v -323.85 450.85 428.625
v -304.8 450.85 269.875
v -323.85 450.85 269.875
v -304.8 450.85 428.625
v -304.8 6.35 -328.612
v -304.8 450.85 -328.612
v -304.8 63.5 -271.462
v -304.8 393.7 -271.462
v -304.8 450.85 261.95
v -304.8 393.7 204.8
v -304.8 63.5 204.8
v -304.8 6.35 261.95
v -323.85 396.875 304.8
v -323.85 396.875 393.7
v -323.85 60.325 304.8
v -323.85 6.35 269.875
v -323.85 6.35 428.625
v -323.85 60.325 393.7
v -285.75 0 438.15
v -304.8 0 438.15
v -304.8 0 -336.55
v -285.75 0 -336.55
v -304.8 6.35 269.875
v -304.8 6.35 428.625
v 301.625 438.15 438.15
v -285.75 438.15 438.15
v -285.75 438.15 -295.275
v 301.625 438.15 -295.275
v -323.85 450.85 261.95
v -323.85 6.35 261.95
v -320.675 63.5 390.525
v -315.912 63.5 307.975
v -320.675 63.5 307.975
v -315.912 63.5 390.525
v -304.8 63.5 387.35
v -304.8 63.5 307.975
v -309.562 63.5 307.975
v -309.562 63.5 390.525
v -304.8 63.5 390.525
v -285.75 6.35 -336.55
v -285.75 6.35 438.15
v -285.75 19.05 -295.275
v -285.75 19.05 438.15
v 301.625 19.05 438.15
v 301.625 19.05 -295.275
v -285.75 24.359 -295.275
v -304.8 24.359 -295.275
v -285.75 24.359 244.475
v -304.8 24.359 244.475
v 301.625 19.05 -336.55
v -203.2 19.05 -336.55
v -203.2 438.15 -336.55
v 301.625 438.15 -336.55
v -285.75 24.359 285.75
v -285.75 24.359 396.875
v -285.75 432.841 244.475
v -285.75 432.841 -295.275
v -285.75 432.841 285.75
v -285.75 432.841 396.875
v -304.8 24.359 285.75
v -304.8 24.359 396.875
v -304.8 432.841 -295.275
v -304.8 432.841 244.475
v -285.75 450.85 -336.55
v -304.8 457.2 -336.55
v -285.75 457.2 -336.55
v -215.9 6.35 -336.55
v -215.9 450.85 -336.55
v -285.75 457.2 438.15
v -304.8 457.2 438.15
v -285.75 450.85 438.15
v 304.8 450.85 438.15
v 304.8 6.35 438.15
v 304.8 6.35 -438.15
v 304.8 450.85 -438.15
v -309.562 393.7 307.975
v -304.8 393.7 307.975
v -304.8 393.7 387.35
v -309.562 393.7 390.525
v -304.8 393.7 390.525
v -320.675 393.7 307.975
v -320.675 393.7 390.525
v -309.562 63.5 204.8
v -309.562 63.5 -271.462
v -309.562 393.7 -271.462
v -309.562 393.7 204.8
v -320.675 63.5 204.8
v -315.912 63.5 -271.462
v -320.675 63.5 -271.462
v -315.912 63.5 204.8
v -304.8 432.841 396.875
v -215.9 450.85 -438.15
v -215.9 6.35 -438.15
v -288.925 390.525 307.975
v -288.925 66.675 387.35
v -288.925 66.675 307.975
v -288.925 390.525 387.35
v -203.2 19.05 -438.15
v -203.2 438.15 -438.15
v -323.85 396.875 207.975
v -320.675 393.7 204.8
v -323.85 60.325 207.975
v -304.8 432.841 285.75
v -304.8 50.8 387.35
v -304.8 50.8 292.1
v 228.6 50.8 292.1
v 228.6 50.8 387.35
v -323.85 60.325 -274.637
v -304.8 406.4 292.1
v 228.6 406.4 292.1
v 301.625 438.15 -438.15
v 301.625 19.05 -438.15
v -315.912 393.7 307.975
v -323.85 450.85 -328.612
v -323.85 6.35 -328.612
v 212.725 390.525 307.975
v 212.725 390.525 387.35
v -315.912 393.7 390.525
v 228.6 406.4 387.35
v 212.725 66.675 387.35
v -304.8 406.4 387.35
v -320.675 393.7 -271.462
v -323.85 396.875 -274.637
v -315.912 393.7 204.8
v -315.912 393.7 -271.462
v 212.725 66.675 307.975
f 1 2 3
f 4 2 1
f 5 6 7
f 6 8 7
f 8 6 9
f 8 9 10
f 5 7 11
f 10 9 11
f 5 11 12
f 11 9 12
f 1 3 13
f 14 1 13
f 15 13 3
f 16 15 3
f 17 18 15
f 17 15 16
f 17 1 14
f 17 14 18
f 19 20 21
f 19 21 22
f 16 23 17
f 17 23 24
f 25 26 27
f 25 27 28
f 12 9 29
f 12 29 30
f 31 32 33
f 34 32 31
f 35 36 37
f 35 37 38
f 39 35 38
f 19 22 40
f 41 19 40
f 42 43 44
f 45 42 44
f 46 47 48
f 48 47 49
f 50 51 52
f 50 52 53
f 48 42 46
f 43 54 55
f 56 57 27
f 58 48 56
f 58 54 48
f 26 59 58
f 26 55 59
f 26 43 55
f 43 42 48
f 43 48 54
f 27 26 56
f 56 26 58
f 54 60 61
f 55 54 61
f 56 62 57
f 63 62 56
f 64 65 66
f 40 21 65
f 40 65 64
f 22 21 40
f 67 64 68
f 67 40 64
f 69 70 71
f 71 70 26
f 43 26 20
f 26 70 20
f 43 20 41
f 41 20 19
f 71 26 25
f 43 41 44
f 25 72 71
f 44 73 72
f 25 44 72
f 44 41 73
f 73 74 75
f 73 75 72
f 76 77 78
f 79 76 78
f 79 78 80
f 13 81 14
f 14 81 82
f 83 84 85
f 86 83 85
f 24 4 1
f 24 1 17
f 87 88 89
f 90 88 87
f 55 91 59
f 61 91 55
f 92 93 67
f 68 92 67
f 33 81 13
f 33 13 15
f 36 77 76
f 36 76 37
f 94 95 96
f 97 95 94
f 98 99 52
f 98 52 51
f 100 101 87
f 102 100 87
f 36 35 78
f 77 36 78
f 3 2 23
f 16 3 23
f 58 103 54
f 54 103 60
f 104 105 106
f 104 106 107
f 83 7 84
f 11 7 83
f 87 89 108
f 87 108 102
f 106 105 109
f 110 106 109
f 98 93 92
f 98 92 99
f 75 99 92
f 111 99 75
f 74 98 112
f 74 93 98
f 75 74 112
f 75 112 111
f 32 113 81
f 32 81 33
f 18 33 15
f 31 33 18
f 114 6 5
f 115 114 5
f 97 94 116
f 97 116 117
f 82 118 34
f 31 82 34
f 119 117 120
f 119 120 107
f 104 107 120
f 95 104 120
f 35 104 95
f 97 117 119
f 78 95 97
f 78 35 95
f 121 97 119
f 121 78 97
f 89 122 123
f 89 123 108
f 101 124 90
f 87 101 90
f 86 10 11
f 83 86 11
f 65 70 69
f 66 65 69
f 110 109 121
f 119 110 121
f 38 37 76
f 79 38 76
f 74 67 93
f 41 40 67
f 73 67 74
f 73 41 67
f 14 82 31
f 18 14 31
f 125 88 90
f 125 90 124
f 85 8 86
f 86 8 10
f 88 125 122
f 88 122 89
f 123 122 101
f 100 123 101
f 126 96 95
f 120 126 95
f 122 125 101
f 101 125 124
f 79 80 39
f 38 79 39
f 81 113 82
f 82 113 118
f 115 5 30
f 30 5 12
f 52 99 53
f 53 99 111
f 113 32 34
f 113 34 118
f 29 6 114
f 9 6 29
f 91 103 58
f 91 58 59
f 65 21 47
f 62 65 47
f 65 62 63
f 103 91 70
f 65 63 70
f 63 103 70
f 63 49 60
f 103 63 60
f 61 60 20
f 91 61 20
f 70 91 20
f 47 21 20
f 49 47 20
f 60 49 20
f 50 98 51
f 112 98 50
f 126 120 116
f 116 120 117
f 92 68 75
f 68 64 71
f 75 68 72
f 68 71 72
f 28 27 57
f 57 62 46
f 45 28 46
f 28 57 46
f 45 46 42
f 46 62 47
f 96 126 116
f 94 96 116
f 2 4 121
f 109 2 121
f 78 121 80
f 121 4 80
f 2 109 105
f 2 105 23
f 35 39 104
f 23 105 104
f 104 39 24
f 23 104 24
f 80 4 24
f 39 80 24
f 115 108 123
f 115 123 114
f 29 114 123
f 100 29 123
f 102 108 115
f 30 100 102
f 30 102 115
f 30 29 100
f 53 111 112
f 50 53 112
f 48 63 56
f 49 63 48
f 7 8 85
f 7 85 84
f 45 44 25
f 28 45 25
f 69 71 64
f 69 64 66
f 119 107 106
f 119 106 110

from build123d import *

# Parameters (mm, degrees)
F0_W          = 609.6
F0_H          = 876.3
F1_DEPTH      = 457.2
F2_W          = 88.9
F2_H          = 101.6
F3_DEPTH      = 457.201
F4_W          = 408.4819672131
F4_H          = 692.15
F5_DEPTH      = 19.05
F6_W          = 590.55
F6_H          = 6.35
F7_DEPTH      = 876.301
F8_W          = 587.375
F8_H          = 419.1
F9_DEPTH      = 733.425
F10_W         = 408.4819672131
F10_H         = 41.275
F11_DEPTH     = 19.05
F12_W         = 444.5
F12_H         = 590.5627
F12_W_2       = 330.2
F12_H_2       = 476.2627
F13_DEPTH     = 19.05
F14_W         = 6.35
F14_H         = 330.2
F15_DEPTH     = 476.2627
F16_SIZE      = 3.175
F17_W         = 444.5
F17_H         = 158.75
F17_W_2       = 330.2
F17_H_2       = 82.55
F18_DEPTH     = 19.05
F19_W         = 6.35
F19_H         = 330.2
F20_DEPTH     = 82.55
F21_SIZE      = 3.175
F22_W         = 504.825
F22_H         = 419.1
F23_DEPTH     = 101.6
F24_W         = 355.6
F24_H         = 95.25
F25_DEPTH     = 533.4
F26_T         = 15.875
F26_T3_DEPTH  = 37.249261314
F26_T5_DEPTH  = 37.249261314
F26_T7_DEPTH  = 37.249261314
F26_T9_DEPTH  = 37.249261314
F26_T11_DEPTH = 36.5125
F26_T13_DEPTH = 361.95
F26_T15_DEPTH = 114.3
F26_T17_DEPTH = 127
F26_T19_DEPTH = 387.35
F26_T21_DEPTH = 111.125
F26_T23_DEPTH = 36.5125


# Not quite as in the source:
# - a shell that OpenCascade refuses in one call is made with other operations: the cavity is built on its own and cut out


with BuildPart() as f1:
    # F0 (on Front) → F1 (new body)
    with BuildSketch(Plane.XZ):
        Rectangle(F0_W, F0_H)
    extrude(amount=-F1_DEPTH)

    # F2 (on face) → F3 (cut, through all)
    with BuildSketch(Plane.XZ):
        with Locations((-260.35, -387.35)):
            Rectangle(F2_W, F2_H)
    extrude(amount=-F3_DEPTH, mode=Mode.SUBTRACT)

    # F4 (on face) → F5 (cut)
    with BuildSketch(Plane(origin=(-304.8, 0, 0), x_dir=(0, -1, 0), z_dir=(-1, 0, 0))):
        with Locations((-228.6, 50.8)):
            Rectangle(F4_W, F4_H)
    extrude(amount=-F5_DEPTH, mode=Mode.SUBTRACT)

    # F6 (on face) → F7 (cut, through all)
    with BuildSketch(Plane.XY.offset(438.15)):
        with Locations((9.525, 454.025)):
            Rectangle(F6_W, F6_H)
        with Locations((9.525, 3.175)):
            Rectangle(F6_W, F6_H)
    extrude(amount=-F7_DEPTH, mode=Mode.SUBTRACT)

    # F8 (on face) → F9 (cut, through all)
    with BuildSketch(Plane.XY.offset(438.15)):
        with Locations((7.9375, 228.6)):
            Rectangle(F8_W, F8_H)
    extrude(amount=-F9_DEPTH, mode=Mode.SUBTRACT)

    # F10 (on face) → F11 (join, through all)
    with BuildSketch(Plane(origin=(-304.8, 0, 0), x_dir=(0, -1, 0), z_dir=(-1, 0, 0))):
        with Locations((-228.6, 265.1125)):
            Rectangle(F10_W, F10_H)
    extrude(amount=-F11_DEPTH)

    # F22 (on face) → F23 (cut)
    with BuildSketch(Plane(origin=(0, 0, -438.15), x_dir=(1, 0, 0), z_dir=(0, 0, -1))):
        with Locations((49.2125, -228.6)):
            Rectangle(F22_W, F22_H)
    extrude(amount=-F23_DEPTH, mode=Mode.SUBTRACT)


with BuildPart() as f13:
    # F12 (on face) → F13 (new body)
    with BuildSketch(Plane(origin=(-304.8, 0, 0), x_dir=(0, -1, 0), z_dir=(-1, 0, 0))):
        with Locations((-228.6, -33.33115)):
            Rectangle(F12_W, F12_H)
        with Locations((-228.6, -33.33115)):
            Rectangle(F12_W_2, F12_H_2, mode=Mode.SUBTRACT)
    extrude(amount=F13_DEPTH)

    # F14 (on face) → F15 (join, through all)
    with BuildSketch(Plane.XY.offset(-271.4625)):
        with Locations((-312.7375, 228.6)):
            Rectangle(F14_W, F14_H)
    extrude(amount=F15_DEPTH)

    # F16
    f16_edges = [f13.edges().sort_by_distance(p)[0] for p in [
        (-323.85, 393.7, -33.33115),
        (-323.85, 228.6, -271.4625),
        (-323.85, 63.5, -33.33115),
        (-323.85, 228.6, 204.8002),
    ]]
    chamfer(f16_edges, length=F16_SIZE)


with BuildPart() as f18:
    # F17 (on face) → F18 (new body)
    with BuildSketch(Plane(origin=(-304.8, 0, 0), x_dir=(0, -1, 0), z_dir=(-1, 0, 0))):
        with Locations((-228.6, 349.25)):
            Rectangle(F17_W, F17_H)
        with Locations((-228.6, 349.25)):
            Rectangle(F17_W_2, F17_H_2, mode=Mode.SUBTRACT)
    extrude(amount=F18_DEPTH)

    # F19 (on face) → F20 (join, through all)
    with BuildSketch(Plane.XY.offset(307.975)):
        with Locations((-312.7375, 228.6)):
            Rectangle(F19_W, F19_H)
    extrude(amount=F20_DEPTH)

    # F21
    f21_edges = [f18.edges().sort_by_distance(p)[0] for p in [
        (-323.85, 228.6, 307.975),
        (-323.85, 393.7, 349.25),
        (-323.85, 228.6, 390.525),
        (-323.85, 63.5, 349.25),
    ]]
    chamfer(f21_edges, length=F21_SIZE)

    # F24 (on face) → F25 (join)
    with BuildSketch(Plane.YZ.offset(-304.8)):
        with Locations((228.6, 339.725)):
            Rectangle(F24_W, F24_H)
    extrude(amount=F25_DEPTH)

    # F26: shell of thickness 15.875, made by hand


with BuildPart() as f26_core1:
    # F26_t2: copy of F18
    add(f18.part)

    # the walls: a layer under each face that stays
    f26_faces = [f26_core1.faces().sort_by_distance(p)[0] for p in [
        (-323.85, 376.7666666667, 296.3333333333),
        (-322.2625, 228.6, 306.3875),
        (-322.2625, 61.9125, 349.25),
        (-322.2625, 395.2875, 349.25),
        (-322.2625, 228.6, 392.1125),
        (-314.325, 228.6, 428.625),
        (-314.325, 450.85, 349.25),
        (-314.325, 228.6, 269.875),
        (-314.325, 6.35, 349.25),
        (-318.29375, 228.6, 307.975),
        (-318.29375, 63.5, 349.25),
        (-318.29375, 393.7, 349.25),
        (-318.29375, 228.6, 390.525),
        (-304.8, 376.7666666667, 402.1666666667),
        (-315.9125, 228.6, 349.25),
        (-38.1, 406.4, 339.725),
        (-38.1, 228.6, 292.1),
        (-38.1, 50.8, 339.725),
        (-307.18125, 63.5, 349.25),
        (-307.18125, 228.6, 390.525),
        (-307.18125, 393.7, 349.25),
        (-304.8, 228.6, 347.6625),
        (228.6, 228.6, 339.725),
        (-307.18125, 228.6, 307.975),
        (-309.5625, 228.6, 349.25),
    ]]
    thicken(f26_faces, amount=-F26_T, mode=Mode.SUBTRACT)

    # F26_s4 → F26_t3 (cut)
    with BuildSketch(Plane(origin=(4.5928978099, 4.5928978099, 4.5928978099), x_dir=(-0.7071067812, 0.7071067812, 0), z_dir=(0.5773502692, 0.5773502692, 0.5773502692))):
        Polygon((271.8908726623, 356.5892701441), (263.7152476623, 342.7036353262), (255.7777476623, 347.2863530879), (255.7777476623, 356.4517886113), align=None)
    extrude(amount=F26_T3_DEPTH, mode=Mode.SUBTRACT)

    # F26_s6 → F26_t5 (cut)
    with BuildSketch(Plane(origin=(-147.8071021901, 147.8071021901, -147.8071021901), x_dir=(0.7071067812, 0.7071067812, 0), z_dir=(0.5773502692, -0.5773502692, 0.5773502692))):
        Polygon((51.3983476961, 543.2403885442), (59.5739726961, 529.3547537263), (67.5114726961, 533.937471488), (67.5114726961, 543.1029070113), align=None)
    extrude(amount=F26_T5_DEPTH, mode=Mode.SUBTRACT)

    # F26_s8 → F26_t7 (cut)
    with BuildSketch(Plane(origin=(-228.2404355234, -228.2404355234, 228.2404355234), x_dir=(-0.7071067812, 0.7071067812, 0), z_dir=(0.5773502692, 0.5773502692, -0.5773502692))):
        Polygon((271.8908726623, 213.7335916339), (255.7777476623, 213.8710731668), (255.7777476623, 223.0365086901), (263.7152476623, 227.6192264518), align=None)
    extrude(amount=F26_T7_DEPTH, mode=Mode.SUBTRACT)

    # F26_s10 → F26_t9 (cut)
    with BuildSketch(Plane(origin=(-380.6404355234, 380.6404355234, 380.6404355234), x_dir=(0.7071067812, 0.7071067812, 0), z_dir=(0.5773502692, -0.5773502692, -0.5773502692))):
        Polygon((51.3983476961, 27.0824732338), (67.5114726961, 27.2199547667), (67.5114726961, 36.3853902901), (59.5739726961, 40.9681080518), align=None)
    extrude(amount=F26_T9_DEPTH, mode=Mode.SUBTRACT)

    # F26_s12 → F26_t11 (cut)
    with BuildSketch(Plane.YZ.offset(-336.55)):
        Polygon((393.54125, 308.13375), (393.7, 292.1), (409.575, 292.1), (409.575, 307.975), align=None)
        Polygon((63.65875, 308.13375), (63.5, 292.1), (47.625, 292.1), (47.625, 307.975), align=None)
        Polygon((63.65875, 390.36625), (47.625, 390.525), (47.625, 406.4), (63.5, 406.4), align=None)
        Polygon((393.54125, 390.36625), (409.575, 390.525), (409.575, 406.4), (393.7, 406.4), align=None)
    extrude(amount=F26_T11_DEPTH, mode=Mode.SUBTRACT)

    # F26_s14 → F26_t13 (cut)
    with BuildSketch(Plane.XZ.offset(-409.575)):
        Polygon((-316.07125, 308.13375), (-315.9125, 292.1), (-300.0375, 292.1), (-300.0375, 307.975), align=None)
        Polygon((-316.07125, 390.36625), (-315.9125, 406.4), (-300.0375, 406.4), (-300.0375, 390.525), align=None)
        Polygon((-309.40375, 390.36625), (-309.5625, 406.4), (-325.4375, 406.4), (-325.4375, 390.525), align=None)
        Polygon((-304.95875, 308.13375), (-288.925, 307.975), (-288.925, 292.1), (-304.8, 292.1), align=None)
        Polygon((-309.40375, 308.13375), (-309.5625, 292.1), (-325.4375, 292.1), (-325.4375, 307.975), align=None)
    extrude(amount=F26_T13_DEPTH, mode=Mode.SUBTRACT)

    # F26_s16 → F26_t15 (cut)
    with BuildSketch(Plane.XY.offset(292.1)):
        Polygon((-316.07125, 63.65875), (-315.9125, 47.625), (-300.0375, 47.625), (-300.0375, 63.5), align=None)
        Polygon((-316.07125, 393.54125), (-315.9125, 409.575), (-300.0375, 409.575), (-300.0375, 393.7), align=None)
        Polygon((-309.40375, 63.65875), (-309.5625, 47.625), (-325.4375, 47.625), (-325.4375, 63.5), align=None)
        Polygon((-309.40375, 393.54125), (-309.5625, 409.575), (-325.4375, 409.575), (-325.4375, 393.7), align=None)
    extrude(amount=F26_T15_DEPTH, mode=Mode.SUBTRACT)

    # F26_s18 → F26_t17 (cut)
    with BuildSketch(Plane.XY.offset(276.225)):
        Polygon((-304.64125, 406.55875), (-320.675, 406.4), (-320.675, 390.525), (-304.8, 390.525), align=None)
        Polygon((-304.64125, 50.64125), (-320.675, 50.8), (-320.675, 66.675), (-304.8, 66.675), align=None)
    extrude(amount=F26_T17_DEPTH, mode=Mode.SUBTRACT)

    # F26_s20 → F26_t19 (cut)
    with BuildSketch(Plane.XZ.offset(-422.275)):
        Polygon((-304.64125, 291.94125), (-320.675, 292.1), (-320.675, 307.975), (-304.8, 307.975), align=None)
    extrude(amount=F26_T19_DEPTH, mode=Mode.SUBTRACT)

    # F26_s22 → F26_t21 (cut)
    with BuildSketch(Plane.XY.offset(292.1)):
        Polygon((-304.95875, 63.65875), (-304.8, 47.625), (-288.925, 47.625), (-288.925, 63.5), align=None)
        Polygon((-304.95875, 393.54125), (-304.8, 409.575), (-288.925, 409.575), (-288.925, 393.7), align=None)
    extrude(amount=F26_T21_DEPTH, mode=Mode.SUBTRACT)

    # F26_s24 → F26_t23 (cut)
    with BuildSketch(Plane.YZ.offset(-325.4375)):
        Polygon((63.65875, 308.13375), (47.625, 307.975), (47.625, 292.1), (63.5, 292.1), align=None)
        Polygon((63.65875, 390.36625), (47.625, 390.525), (47.625, 406.4), (63.5, 406.4), align=None)
        Polygon((393.54125, 390.36625), (393.7, 406.4), (409.575, 406.4), (409.575, 390.525), align=None)
        Polygon((393.54125, 308.13375), (409.575, 307.975), (409.575, 292.1), (393.7, 292.1), align=None)
    extrude(amount=F26_T23_DEPTH, mode=Mode.SUBTRACT)


with BuildPart() as f18_1:
    add(f18.part)

    # what is left inside the walls is the cavity
    f26_cavity = [f26_core1.part.solids().sort_by_distance(p)[0] for p in [
        (45.508333, 228.6, 308.13375),
    ]]
    add(f26_cavity, mode=Mode.SUBTRACT)


solid = Compound([f1.part, f13.part, f18_1.part])
